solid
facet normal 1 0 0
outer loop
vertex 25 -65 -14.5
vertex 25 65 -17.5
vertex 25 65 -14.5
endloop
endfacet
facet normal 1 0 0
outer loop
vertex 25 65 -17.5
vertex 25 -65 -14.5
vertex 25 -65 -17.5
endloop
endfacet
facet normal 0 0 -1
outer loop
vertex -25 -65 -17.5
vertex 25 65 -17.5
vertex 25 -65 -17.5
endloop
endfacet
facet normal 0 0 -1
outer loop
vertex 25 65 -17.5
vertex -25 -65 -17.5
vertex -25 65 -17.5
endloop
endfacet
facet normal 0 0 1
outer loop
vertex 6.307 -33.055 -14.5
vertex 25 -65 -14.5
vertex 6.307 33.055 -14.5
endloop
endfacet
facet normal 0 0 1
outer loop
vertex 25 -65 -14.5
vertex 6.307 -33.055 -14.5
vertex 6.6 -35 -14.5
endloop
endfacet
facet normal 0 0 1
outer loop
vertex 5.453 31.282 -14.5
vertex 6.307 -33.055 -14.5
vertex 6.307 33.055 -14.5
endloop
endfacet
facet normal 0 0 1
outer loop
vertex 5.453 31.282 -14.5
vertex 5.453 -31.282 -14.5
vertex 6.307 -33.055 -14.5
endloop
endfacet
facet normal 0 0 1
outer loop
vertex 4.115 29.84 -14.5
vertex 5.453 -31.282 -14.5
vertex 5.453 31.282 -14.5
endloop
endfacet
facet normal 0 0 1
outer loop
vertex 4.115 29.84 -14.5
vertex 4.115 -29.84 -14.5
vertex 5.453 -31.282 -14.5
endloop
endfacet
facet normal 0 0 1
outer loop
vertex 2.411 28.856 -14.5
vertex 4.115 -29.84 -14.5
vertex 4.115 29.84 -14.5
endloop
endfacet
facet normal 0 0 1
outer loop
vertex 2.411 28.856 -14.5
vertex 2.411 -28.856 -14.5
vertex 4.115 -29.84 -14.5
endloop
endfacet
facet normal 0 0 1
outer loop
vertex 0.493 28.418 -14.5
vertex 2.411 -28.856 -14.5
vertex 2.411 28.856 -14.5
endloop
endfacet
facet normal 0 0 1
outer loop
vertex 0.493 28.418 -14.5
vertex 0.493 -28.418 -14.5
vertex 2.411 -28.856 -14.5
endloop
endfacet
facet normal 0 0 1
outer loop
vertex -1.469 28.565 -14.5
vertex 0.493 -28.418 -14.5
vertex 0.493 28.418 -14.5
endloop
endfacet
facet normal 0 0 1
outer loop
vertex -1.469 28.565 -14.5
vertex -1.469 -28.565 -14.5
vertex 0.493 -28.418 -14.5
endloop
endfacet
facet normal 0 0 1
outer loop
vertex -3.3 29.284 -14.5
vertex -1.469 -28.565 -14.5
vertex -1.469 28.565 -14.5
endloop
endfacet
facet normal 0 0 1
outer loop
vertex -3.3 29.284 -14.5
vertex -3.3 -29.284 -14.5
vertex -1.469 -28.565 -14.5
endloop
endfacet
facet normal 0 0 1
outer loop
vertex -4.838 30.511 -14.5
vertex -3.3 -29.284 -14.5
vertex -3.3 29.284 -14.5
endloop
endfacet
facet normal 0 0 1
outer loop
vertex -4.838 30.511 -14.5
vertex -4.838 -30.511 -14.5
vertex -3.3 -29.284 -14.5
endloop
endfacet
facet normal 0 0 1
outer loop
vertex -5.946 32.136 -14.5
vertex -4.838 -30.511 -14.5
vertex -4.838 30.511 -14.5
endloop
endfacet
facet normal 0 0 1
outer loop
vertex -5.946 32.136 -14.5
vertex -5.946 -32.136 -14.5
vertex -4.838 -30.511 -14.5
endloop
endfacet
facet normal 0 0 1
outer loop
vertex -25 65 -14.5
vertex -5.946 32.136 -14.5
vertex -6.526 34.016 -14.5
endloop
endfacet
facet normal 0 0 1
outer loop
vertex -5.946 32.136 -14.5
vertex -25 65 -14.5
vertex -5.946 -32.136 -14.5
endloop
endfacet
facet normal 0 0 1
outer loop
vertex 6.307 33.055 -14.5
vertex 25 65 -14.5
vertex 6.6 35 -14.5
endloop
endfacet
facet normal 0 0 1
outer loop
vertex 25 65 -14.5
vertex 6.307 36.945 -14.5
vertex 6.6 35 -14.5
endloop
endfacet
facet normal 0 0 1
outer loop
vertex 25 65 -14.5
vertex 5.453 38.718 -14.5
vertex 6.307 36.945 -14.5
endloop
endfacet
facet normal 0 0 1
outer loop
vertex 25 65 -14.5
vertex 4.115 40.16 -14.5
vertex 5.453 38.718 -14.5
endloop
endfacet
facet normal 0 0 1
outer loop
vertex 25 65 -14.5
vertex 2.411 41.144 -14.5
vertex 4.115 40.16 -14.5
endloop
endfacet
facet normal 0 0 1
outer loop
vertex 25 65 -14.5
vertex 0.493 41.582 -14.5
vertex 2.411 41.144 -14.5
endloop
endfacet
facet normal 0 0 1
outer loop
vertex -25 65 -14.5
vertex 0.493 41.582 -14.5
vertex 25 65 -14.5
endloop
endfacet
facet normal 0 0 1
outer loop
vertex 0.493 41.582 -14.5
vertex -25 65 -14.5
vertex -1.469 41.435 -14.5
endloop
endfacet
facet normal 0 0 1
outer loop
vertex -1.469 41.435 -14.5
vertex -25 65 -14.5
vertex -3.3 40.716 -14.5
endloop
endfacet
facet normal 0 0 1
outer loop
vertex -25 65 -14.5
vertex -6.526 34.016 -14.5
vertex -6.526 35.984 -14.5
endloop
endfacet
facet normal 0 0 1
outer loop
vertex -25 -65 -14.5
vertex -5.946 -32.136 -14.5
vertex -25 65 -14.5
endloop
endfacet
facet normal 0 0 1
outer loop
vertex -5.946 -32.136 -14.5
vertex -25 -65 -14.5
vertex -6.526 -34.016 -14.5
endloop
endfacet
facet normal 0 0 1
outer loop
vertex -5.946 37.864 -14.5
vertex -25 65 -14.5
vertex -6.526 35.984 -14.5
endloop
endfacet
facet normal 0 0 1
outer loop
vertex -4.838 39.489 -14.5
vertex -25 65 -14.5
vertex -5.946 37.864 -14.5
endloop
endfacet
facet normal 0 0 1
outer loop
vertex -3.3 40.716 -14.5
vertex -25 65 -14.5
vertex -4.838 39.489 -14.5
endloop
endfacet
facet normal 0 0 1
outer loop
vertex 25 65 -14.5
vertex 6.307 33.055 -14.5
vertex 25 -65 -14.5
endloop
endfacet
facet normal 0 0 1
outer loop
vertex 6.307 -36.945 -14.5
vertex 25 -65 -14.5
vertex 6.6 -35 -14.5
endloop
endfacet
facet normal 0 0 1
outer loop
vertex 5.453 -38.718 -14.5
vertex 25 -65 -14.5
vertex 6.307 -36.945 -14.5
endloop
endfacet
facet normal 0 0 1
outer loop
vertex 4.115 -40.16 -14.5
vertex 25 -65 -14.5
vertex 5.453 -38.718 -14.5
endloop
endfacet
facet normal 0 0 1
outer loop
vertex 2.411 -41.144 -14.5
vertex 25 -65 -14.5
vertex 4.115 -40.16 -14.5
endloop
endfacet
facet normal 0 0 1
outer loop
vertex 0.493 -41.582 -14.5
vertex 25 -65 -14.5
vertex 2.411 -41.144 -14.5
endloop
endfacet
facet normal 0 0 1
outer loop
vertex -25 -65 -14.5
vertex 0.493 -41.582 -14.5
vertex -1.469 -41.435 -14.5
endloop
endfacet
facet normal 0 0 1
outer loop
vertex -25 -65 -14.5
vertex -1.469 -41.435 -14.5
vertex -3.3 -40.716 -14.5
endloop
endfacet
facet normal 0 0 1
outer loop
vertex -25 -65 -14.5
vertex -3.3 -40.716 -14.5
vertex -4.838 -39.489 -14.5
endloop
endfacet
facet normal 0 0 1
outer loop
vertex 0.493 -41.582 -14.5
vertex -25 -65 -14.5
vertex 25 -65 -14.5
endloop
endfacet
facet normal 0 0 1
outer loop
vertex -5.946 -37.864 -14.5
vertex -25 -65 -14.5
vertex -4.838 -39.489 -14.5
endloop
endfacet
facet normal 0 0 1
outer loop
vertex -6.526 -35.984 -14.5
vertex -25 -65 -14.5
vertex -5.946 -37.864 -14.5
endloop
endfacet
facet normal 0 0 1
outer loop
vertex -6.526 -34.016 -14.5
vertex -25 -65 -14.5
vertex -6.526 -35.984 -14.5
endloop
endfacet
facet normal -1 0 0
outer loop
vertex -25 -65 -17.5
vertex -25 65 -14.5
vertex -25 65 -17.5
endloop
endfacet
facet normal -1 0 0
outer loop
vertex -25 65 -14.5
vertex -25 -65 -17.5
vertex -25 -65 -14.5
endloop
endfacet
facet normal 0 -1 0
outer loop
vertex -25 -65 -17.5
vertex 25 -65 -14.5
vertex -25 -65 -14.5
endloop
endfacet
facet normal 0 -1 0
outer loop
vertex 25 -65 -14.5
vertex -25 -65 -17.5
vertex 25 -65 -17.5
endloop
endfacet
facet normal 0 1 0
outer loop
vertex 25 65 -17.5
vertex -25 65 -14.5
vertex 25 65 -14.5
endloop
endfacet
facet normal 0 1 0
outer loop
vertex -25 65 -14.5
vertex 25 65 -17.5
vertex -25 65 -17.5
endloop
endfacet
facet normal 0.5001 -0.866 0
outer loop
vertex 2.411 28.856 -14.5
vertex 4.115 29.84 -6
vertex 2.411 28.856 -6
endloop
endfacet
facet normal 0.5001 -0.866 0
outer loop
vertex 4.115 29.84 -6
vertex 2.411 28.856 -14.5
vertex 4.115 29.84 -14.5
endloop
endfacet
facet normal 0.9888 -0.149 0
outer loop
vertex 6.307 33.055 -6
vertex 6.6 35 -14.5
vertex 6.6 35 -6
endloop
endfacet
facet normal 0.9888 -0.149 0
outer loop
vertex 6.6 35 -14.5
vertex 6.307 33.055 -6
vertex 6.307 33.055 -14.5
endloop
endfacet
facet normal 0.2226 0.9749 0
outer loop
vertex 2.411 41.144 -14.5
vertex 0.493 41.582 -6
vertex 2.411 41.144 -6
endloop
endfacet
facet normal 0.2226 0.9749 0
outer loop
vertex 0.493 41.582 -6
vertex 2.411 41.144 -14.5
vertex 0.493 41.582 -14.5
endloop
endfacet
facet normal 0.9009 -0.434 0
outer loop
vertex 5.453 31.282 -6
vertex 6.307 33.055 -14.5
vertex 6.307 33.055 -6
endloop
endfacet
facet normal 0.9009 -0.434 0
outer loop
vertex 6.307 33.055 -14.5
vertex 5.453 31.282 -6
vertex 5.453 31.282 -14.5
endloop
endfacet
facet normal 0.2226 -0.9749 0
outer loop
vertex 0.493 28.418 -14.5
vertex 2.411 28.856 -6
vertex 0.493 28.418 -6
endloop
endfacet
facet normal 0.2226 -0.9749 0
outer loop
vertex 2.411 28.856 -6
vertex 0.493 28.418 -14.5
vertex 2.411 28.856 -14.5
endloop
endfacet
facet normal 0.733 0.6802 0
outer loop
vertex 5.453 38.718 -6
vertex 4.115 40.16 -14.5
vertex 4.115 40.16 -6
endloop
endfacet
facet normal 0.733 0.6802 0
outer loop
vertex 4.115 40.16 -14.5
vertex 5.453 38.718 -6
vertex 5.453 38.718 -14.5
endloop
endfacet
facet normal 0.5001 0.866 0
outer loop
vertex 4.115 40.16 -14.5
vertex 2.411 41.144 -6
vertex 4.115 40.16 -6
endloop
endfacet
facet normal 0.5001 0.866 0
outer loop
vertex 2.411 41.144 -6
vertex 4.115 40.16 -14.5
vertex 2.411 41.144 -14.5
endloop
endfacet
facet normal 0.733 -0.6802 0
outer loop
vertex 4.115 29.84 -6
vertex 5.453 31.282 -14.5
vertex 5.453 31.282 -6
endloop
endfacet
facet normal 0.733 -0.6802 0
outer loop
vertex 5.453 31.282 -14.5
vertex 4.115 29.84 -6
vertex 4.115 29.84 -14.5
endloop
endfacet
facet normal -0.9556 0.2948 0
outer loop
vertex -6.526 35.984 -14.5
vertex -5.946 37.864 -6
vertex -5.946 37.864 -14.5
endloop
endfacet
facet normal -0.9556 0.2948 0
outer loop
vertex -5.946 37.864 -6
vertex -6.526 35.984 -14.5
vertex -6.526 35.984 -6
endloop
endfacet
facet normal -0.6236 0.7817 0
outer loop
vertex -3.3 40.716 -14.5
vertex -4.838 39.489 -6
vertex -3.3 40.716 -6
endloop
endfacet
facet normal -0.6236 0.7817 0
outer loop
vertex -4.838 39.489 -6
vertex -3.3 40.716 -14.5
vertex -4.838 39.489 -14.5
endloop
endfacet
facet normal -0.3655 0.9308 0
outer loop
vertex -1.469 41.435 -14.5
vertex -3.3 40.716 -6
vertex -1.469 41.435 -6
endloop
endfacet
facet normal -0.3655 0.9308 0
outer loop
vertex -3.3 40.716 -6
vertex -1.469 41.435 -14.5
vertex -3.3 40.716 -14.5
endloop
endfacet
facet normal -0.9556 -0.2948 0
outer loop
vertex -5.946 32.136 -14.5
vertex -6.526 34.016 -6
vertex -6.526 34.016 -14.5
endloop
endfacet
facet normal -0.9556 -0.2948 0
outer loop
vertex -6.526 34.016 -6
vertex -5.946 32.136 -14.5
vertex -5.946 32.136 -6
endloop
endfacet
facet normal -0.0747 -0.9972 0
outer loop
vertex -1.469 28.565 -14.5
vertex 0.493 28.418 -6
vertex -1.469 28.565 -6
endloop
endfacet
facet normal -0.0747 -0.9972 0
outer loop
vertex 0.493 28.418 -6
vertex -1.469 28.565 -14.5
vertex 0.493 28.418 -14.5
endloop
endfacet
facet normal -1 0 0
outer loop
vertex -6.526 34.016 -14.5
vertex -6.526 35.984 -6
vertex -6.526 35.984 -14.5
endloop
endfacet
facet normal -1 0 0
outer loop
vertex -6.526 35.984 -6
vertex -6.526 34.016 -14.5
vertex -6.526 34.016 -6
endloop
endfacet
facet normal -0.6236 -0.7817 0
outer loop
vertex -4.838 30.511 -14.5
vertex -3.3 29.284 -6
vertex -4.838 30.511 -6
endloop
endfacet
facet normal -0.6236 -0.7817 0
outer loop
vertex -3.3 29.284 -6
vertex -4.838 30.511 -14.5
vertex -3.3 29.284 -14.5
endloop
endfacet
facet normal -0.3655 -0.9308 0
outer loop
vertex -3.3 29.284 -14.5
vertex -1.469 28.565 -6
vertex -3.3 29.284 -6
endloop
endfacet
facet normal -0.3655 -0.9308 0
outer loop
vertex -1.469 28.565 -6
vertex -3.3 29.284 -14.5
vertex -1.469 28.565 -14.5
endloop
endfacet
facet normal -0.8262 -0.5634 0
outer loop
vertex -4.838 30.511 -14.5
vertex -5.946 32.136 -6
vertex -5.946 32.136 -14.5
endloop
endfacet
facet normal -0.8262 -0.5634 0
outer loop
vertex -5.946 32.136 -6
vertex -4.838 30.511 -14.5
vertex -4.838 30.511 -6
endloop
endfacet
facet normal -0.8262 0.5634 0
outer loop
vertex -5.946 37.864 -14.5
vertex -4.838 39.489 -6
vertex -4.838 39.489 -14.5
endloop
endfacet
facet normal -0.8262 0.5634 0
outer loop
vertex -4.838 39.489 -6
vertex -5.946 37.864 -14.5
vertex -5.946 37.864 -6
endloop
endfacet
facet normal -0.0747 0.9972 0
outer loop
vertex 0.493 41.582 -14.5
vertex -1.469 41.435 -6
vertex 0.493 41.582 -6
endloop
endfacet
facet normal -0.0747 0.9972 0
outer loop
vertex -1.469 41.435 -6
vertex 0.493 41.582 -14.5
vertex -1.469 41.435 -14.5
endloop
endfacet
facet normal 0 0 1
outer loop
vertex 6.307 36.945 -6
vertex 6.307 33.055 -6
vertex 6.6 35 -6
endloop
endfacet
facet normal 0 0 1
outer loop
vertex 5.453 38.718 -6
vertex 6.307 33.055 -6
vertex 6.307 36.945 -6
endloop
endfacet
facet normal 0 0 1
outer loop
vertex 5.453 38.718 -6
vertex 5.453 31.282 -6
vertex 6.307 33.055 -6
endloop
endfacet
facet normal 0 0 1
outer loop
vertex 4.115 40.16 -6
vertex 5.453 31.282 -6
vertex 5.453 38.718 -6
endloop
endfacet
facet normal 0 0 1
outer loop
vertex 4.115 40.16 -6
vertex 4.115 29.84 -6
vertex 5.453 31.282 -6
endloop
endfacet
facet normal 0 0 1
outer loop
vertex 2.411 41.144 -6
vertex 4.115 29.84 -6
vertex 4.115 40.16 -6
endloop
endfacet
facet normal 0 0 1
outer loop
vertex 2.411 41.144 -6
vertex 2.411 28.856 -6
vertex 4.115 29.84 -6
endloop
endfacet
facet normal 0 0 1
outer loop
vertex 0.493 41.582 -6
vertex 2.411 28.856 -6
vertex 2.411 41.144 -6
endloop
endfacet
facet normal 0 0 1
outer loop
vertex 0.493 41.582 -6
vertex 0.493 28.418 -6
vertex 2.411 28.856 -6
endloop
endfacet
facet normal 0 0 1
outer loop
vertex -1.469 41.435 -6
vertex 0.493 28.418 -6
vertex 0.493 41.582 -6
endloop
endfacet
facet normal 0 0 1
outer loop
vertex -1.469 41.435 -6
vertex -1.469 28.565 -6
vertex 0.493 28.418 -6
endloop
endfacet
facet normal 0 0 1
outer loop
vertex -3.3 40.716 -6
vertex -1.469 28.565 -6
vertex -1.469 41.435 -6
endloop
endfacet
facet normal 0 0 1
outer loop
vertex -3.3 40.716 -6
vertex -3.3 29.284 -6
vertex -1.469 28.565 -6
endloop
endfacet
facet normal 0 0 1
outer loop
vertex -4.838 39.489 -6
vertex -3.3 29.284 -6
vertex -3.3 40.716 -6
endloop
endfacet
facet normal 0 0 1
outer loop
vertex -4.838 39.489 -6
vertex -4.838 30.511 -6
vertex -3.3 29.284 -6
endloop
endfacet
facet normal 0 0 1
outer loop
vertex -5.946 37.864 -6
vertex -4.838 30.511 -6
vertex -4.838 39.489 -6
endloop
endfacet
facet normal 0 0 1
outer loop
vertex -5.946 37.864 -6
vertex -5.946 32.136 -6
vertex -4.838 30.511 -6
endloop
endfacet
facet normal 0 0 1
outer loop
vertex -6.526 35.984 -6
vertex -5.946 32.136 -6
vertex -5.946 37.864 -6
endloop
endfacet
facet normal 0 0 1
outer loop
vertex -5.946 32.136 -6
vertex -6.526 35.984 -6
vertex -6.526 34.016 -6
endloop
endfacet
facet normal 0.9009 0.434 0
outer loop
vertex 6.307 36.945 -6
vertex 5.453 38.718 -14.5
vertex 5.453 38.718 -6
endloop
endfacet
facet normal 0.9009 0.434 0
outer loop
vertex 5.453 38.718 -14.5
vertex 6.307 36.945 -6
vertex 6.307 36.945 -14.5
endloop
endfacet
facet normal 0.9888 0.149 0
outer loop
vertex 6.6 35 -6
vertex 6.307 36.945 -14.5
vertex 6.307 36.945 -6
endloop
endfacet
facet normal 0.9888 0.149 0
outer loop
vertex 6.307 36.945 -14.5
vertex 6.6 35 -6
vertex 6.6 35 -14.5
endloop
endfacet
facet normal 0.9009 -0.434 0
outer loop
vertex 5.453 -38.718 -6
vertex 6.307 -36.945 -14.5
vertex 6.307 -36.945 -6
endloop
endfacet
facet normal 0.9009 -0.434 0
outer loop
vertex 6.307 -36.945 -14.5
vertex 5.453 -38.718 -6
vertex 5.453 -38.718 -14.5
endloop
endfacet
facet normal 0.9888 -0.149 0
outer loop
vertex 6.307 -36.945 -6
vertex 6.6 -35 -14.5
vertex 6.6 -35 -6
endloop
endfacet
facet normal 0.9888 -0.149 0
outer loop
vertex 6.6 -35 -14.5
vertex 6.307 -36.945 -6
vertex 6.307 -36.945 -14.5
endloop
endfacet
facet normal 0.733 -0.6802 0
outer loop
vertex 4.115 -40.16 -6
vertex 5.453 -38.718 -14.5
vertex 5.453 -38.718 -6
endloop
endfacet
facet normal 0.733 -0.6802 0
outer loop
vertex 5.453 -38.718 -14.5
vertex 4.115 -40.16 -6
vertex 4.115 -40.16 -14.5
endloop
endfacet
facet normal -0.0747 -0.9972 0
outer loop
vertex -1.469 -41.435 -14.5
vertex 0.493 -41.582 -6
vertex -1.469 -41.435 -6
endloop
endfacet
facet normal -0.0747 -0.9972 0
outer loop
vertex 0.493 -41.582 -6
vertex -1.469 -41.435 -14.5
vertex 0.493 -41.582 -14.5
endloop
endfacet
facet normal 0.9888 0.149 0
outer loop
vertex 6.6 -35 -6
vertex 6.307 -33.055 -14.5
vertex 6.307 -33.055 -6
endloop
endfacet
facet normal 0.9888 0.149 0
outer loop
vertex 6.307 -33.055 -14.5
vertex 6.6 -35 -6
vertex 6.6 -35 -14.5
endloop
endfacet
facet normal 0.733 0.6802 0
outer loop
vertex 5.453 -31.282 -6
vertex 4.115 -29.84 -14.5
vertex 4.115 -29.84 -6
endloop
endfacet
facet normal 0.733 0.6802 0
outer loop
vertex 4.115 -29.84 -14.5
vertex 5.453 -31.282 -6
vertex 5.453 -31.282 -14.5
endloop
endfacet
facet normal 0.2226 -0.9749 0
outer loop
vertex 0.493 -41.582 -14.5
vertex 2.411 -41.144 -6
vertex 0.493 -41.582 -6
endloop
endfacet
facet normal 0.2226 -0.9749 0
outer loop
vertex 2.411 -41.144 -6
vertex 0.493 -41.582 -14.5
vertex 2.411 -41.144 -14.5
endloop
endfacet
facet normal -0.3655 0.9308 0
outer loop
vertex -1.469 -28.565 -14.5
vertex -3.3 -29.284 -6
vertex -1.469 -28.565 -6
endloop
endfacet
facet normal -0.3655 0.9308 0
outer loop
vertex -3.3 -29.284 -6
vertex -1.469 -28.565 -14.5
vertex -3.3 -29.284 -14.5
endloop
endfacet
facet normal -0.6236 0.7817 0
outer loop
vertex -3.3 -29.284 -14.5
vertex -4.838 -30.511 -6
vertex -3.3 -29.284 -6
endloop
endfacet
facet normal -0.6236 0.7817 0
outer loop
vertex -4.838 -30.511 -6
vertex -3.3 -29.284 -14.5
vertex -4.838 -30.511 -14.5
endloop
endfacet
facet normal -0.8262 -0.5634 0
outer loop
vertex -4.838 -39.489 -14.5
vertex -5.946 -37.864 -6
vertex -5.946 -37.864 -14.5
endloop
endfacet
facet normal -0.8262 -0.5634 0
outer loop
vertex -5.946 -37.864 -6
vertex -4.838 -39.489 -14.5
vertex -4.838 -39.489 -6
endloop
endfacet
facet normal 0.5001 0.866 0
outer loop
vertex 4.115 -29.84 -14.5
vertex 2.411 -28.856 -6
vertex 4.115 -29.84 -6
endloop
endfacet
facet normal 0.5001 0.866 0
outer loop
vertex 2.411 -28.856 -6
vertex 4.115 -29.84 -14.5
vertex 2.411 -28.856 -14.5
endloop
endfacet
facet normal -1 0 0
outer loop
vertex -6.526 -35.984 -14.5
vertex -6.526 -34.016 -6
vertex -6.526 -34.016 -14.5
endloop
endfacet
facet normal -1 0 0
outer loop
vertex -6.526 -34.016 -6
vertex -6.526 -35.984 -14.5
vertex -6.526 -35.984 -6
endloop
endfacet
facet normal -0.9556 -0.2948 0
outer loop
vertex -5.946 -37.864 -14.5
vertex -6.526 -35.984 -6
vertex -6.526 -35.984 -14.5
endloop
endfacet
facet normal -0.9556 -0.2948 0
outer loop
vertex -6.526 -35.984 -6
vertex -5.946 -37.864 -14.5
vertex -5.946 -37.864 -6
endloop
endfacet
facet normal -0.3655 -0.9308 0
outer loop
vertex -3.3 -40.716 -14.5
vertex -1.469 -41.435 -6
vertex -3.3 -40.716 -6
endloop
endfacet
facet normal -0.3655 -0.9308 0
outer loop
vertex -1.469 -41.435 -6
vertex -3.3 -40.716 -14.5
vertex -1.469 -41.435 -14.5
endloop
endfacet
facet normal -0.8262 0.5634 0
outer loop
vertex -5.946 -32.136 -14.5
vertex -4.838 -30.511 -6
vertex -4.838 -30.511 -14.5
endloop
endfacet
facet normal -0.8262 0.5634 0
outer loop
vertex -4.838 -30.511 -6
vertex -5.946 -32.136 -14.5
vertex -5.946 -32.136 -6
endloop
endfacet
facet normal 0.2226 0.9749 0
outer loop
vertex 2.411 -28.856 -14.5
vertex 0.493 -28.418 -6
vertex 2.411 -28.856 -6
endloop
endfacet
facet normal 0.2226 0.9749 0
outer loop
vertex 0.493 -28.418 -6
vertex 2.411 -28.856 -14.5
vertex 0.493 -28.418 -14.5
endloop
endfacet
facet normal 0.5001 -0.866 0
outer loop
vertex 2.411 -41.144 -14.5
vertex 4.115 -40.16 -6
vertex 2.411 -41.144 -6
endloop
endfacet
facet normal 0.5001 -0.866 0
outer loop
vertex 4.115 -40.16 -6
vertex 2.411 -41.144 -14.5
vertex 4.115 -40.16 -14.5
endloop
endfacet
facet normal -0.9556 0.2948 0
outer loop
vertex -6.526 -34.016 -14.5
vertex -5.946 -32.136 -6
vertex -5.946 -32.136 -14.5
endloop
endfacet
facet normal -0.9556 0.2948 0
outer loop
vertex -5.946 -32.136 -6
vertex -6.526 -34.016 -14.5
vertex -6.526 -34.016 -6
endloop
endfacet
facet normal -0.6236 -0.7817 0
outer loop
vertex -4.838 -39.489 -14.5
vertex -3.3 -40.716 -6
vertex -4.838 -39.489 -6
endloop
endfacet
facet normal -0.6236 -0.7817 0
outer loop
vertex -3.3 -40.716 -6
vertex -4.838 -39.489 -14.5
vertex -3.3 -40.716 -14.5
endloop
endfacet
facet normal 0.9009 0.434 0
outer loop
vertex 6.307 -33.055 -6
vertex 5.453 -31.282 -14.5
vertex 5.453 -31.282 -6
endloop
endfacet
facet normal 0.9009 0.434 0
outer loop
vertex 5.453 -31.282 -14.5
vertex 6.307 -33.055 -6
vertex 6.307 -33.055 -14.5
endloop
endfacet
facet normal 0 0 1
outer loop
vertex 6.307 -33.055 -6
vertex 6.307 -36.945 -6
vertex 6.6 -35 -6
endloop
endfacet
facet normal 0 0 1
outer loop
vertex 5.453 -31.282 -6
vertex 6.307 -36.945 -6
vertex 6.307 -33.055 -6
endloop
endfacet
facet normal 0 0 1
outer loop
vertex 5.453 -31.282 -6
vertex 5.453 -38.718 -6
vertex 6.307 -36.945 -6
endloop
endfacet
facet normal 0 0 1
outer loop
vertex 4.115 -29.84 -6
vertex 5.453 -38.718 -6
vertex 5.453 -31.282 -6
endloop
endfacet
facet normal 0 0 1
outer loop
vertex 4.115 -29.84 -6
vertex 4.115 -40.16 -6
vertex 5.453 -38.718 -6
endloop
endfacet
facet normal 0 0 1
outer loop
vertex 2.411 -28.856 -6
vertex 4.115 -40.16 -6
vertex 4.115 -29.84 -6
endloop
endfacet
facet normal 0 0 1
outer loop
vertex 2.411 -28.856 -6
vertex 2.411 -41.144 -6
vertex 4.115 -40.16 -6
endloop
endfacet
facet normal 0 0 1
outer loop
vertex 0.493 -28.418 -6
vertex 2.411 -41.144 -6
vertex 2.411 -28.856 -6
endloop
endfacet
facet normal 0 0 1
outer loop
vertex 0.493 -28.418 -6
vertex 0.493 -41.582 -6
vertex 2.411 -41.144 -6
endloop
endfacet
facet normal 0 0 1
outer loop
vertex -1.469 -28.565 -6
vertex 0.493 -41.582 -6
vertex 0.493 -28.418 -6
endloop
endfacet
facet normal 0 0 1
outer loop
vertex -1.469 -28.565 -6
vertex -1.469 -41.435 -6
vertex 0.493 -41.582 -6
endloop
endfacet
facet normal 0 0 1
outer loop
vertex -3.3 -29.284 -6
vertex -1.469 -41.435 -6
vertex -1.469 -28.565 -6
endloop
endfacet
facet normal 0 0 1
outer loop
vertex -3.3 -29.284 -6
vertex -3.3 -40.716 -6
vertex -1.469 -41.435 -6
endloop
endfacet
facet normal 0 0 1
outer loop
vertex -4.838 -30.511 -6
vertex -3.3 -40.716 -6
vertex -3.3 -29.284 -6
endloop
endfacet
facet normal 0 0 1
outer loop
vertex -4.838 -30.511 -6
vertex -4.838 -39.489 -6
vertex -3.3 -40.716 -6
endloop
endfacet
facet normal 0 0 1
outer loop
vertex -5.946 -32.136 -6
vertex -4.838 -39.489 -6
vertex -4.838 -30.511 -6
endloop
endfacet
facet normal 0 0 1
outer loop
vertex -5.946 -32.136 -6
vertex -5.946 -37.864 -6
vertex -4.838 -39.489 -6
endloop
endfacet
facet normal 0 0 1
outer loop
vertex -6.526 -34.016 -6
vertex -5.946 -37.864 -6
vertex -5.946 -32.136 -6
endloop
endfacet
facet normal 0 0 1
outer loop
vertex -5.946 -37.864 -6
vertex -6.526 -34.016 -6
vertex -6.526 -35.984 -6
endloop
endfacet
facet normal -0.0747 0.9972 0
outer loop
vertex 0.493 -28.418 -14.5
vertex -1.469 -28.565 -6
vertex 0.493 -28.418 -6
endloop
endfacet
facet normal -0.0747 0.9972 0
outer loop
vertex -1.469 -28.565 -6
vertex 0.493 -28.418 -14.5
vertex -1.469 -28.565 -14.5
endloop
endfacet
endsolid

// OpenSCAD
module total(){translate([0,0,16])cube([50,130,3],center=true);
translate([0,-35,6])cylinder(10,6.6,6.6);
translate([0,35,6])cylinder(10,6.6,6.6);}

rotate([180,0,0])total();
